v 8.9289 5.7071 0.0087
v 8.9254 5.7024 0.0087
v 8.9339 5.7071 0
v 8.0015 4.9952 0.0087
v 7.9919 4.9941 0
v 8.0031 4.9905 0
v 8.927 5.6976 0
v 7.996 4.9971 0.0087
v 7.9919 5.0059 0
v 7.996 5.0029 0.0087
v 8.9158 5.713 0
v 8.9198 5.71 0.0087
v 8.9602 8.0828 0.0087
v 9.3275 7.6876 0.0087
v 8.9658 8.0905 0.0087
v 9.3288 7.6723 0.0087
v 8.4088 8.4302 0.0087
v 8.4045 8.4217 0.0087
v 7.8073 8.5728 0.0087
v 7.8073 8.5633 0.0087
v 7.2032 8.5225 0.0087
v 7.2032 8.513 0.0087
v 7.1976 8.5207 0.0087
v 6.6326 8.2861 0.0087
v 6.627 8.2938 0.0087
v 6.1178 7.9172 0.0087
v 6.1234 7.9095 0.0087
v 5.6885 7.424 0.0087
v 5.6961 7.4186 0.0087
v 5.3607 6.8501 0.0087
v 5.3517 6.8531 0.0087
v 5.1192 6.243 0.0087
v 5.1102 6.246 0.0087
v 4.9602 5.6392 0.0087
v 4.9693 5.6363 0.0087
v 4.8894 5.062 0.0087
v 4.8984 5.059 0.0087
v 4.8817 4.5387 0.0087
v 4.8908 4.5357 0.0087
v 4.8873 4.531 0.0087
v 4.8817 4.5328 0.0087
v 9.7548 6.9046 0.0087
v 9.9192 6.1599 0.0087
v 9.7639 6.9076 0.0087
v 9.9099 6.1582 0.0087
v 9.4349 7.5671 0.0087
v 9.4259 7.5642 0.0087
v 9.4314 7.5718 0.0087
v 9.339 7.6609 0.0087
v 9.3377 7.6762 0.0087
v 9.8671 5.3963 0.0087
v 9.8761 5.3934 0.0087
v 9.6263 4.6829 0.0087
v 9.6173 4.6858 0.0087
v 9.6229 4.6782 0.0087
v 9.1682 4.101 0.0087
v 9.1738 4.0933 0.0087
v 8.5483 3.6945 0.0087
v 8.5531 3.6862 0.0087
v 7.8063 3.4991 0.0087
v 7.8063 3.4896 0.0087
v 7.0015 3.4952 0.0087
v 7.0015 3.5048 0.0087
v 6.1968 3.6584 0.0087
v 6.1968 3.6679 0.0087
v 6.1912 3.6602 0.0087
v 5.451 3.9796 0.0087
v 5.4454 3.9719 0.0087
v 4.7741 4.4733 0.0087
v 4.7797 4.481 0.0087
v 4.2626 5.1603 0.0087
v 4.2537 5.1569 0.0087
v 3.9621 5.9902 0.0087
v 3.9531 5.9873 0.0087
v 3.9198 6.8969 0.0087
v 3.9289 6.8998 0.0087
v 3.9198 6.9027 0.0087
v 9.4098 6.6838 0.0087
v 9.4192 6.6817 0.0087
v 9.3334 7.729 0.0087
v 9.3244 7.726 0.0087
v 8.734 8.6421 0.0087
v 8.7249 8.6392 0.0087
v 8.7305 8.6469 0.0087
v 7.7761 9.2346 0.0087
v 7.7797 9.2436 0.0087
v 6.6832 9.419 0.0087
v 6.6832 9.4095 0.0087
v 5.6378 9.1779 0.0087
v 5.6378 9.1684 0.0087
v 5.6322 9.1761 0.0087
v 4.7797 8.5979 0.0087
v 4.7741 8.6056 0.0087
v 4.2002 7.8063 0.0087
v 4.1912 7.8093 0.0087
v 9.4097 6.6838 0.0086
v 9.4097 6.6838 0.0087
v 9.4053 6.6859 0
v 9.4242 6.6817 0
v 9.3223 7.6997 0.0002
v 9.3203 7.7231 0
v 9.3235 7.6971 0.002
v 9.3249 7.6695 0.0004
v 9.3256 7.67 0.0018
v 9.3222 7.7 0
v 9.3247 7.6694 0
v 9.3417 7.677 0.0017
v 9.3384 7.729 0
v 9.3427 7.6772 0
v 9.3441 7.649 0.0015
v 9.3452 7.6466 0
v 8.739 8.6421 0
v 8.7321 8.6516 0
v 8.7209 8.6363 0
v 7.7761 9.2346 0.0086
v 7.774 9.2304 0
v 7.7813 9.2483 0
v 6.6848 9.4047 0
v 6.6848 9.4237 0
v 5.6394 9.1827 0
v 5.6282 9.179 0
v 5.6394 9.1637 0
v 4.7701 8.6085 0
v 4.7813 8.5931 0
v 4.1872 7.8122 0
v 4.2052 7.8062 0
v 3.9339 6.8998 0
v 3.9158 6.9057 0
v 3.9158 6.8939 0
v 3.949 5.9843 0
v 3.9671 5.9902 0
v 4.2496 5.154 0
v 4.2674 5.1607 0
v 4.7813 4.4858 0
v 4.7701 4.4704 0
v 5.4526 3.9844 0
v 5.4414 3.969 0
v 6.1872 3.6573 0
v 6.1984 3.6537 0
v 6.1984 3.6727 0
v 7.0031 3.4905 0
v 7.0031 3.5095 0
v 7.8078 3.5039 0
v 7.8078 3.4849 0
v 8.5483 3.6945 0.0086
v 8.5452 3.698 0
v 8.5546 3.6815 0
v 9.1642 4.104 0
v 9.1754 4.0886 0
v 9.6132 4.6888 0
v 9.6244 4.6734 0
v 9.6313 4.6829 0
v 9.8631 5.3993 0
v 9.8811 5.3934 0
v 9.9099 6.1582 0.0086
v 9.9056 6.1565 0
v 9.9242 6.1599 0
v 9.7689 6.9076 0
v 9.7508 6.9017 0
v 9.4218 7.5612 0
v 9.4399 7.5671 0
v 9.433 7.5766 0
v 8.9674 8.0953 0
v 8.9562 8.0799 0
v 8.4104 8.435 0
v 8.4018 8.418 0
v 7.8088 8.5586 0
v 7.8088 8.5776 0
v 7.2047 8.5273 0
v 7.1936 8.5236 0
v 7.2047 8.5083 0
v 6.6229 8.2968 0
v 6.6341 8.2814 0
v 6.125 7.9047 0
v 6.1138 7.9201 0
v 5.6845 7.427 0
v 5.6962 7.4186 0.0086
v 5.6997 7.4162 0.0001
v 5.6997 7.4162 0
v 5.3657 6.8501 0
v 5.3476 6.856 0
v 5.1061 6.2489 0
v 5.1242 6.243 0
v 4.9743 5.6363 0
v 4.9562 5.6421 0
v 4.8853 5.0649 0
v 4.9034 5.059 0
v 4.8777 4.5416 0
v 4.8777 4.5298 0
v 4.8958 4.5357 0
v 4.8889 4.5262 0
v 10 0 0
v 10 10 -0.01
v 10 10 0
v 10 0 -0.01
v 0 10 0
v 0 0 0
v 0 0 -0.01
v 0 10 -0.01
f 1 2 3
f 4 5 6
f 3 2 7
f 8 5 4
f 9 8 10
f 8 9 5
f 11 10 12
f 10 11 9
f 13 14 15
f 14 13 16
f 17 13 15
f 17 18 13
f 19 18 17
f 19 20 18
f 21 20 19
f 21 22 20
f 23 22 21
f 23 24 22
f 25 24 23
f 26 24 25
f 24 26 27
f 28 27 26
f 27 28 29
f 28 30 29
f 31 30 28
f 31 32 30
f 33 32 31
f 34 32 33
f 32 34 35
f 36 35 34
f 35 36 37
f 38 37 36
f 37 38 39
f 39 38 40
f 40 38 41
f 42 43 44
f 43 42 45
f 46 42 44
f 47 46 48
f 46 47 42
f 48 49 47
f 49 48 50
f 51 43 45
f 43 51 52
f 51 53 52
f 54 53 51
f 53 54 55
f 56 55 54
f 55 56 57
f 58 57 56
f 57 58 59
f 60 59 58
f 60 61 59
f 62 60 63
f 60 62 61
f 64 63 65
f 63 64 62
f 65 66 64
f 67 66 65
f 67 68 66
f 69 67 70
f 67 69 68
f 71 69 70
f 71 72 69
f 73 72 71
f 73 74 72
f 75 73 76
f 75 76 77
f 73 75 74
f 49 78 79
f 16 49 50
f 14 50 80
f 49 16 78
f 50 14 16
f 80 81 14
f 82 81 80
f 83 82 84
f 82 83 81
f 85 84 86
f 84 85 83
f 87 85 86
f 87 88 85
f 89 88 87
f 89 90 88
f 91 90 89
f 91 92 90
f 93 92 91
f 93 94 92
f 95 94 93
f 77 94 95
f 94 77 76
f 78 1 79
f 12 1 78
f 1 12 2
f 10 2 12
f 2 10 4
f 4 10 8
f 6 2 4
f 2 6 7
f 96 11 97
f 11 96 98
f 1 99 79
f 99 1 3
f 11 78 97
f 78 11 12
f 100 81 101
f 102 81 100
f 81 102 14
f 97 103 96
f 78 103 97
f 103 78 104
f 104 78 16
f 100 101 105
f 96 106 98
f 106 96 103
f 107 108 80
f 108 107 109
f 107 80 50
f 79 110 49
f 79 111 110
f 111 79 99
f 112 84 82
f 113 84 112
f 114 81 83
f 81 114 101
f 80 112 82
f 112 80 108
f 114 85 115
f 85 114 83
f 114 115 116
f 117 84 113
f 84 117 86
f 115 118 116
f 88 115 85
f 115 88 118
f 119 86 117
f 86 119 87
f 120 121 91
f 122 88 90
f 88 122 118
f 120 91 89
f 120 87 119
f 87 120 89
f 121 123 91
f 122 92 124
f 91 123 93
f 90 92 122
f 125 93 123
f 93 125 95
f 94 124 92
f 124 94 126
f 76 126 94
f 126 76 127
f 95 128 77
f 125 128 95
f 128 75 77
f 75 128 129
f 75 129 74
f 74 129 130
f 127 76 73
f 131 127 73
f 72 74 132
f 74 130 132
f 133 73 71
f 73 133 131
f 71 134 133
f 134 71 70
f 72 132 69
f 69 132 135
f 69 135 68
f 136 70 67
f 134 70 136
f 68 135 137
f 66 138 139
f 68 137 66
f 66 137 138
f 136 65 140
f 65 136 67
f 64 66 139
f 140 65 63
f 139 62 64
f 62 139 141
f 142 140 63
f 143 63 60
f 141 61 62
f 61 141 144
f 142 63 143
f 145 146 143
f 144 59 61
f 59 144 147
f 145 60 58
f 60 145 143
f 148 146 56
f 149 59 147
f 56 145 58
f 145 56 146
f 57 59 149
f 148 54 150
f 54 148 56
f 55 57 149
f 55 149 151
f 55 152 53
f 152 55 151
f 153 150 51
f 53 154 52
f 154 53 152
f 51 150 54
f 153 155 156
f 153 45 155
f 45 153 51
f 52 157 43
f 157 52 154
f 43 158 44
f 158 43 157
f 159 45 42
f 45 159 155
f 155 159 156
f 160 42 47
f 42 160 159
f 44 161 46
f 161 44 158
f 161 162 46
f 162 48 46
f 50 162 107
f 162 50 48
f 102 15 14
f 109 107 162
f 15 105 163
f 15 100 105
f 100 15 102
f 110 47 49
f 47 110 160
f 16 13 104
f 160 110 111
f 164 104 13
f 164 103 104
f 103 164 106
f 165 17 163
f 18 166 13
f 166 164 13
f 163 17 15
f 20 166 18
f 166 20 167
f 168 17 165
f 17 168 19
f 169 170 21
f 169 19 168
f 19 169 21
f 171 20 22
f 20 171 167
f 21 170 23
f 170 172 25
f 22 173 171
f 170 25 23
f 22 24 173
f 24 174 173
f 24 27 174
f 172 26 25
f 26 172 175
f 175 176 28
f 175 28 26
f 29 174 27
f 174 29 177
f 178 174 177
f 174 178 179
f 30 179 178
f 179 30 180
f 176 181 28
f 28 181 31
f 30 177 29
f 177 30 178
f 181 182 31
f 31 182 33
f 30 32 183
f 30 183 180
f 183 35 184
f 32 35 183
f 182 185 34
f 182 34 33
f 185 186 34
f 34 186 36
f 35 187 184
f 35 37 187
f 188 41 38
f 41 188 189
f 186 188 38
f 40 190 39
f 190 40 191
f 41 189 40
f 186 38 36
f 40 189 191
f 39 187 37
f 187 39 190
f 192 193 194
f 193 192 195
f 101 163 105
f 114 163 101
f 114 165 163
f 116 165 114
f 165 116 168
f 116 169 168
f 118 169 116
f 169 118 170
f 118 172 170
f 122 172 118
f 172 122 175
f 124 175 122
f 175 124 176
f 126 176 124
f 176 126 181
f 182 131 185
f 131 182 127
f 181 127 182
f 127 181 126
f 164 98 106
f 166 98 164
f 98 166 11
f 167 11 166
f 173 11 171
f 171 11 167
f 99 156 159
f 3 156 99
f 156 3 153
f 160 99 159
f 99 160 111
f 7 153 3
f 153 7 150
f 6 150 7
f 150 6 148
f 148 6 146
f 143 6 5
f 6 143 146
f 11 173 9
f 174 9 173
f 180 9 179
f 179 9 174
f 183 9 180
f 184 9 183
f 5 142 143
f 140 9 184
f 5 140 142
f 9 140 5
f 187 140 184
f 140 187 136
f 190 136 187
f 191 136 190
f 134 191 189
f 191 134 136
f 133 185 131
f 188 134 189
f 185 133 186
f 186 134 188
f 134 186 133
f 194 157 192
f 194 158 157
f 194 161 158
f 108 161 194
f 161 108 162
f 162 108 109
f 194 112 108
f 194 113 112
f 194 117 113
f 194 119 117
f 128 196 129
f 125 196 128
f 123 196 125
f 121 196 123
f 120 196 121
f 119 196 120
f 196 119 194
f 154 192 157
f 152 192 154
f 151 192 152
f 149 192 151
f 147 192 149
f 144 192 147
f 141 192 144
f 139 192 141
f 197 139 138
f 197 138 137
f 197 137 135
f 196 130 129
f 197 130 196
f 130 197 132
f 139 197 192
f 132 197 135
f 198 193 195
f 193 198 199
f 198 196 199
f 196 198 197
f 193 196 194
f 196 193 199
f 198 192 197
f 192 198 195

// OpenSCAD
hull(){
    translate([8.0, 5.0]) sphere(0.01);
    translate([8.923879532511288, 5.707106781186548]) sphere(0.01);
}
hull(){
    translate([8.923879532511288, 5.707106781186548]) sphere(0.01);
    translate([9.414213562373096, 6.681695534462901]) sphere(0.01);
}
hull(){
    translate([9.414213562373096, 6.681695534462901]) sphere(0.01);
    translate([9.32842712474619, 7.728968627421411]) sphere(0.01);
}
hull(){
    translate([9.32842712474619, 7.728968627421411]) sphere(0.01);
    translate([8.72896862742141, 8.642135623730951]) sphere(0.01);
}
hull(){
    translate([8.72896862742141, 8.642135623730951]) sphere(0.01);
    translate([7.778174593052022, 9.238795325112868]) sphere(0.01);
}
hull(){
    translate([7.778174593052022, 9.238795325112868]) sphere(0.01);
    translate([6.681695534462901, 9.414213562373096]) sphere(0.01);
}
hull(){
    translate([6.681695534462901, 9.414213562373096]) sphere(0.01);
    translate([5.636271020618318, 9.173165676349102]) sphere(0.01);
}
hull(){
    translate([5.636271020618318, 9.173165676349102]) sphere(0.01);
    translate([4.778174593052023, 8.60263442893731]) sphere(0.01);
}
hull(){
    translate([4.778174593052023, 8.60263442893731]) sphere(0.01);
    translate([4.195262254874781, 7.806334362268053]) sphere(0.01);
}
hull(){
    translate([4.195262254874781, 7.806334362268053]) sphere(0.01);
    translate([3.923879532511287, 6.899796377705886]) sphere(0.01);
}
hull(){
    translate([3.923879532511287, 6.899796377705886]) sphere(0.01);
    translate([3.957106781186548, 5.990203622294114]) sphere(0.01);
}
hull(){
    translate([3.957106781186548, 5.990203622294114]) sphere(0.01);
    translate([4.257731092227135, 5.159862406744893]) sphere(0.01);
}
hull(){
    translate([4.257731092227135, 5.159862406744893]) sphere(0.01);
    translate([4.778174593052022, 4.476264755067966]) sphere(0.01);
}
hull(){
    translate([4.778174593052022, 4.476264755067966]) sphere(0.01);
    translate([5.449489742783178, 3.974874092559089]) sphere(0.01);
}
hull(){
    translate([5.449489742783178, 3.974874092559089]) sphere(0.01);
    translate([6.195262254874781, 3.663165676349102]) sphere(0.01);
}
hull(){
    translate([6.195262254874781, 3.663165676349102]) sphere(0.01);
    translate([7.0, 3.5]) sphere(0.01);
}
hull(){
    translate([7.0, 3.5]) sphere(0.01);
    translate([7.804737745125219, 3.494381533400286]) sphere(0.01);
}
hull(){
    translate([7.804737745125219, 3.494381533400286]) sphere(0.01);
    translate([8.551510257216822, 3.69098300562505]) sphere(0.01);
}
hull(){
    translate([8.551510257216822, 3.69098300562505]) sphere(0.01);
    translate([9.172268907772864, 4.098076211353316]) sphere(0.01);
}
hull(){
    translate([9.172268907772864, 4.098076211353316]) sphere(0.01);
    translate([9.621320343650899, 4.682905726811017]) sphere(0.01);
}
hull(){
    translate([9.621320343650899, 4.682905726811017]) sphere(0.01);
    translate([9.871145686361793, 5.393398282201787]) sphere(0.01);
}
hull(){
    translate([9.871145686361793, 5.393398282201787]) sphere(0.01);
    translate([9.914213562373096, 6.159862406744894]) sphere(0.01);
}
hull(){
    translate([9.914213562373096, 6.159862406744894]) sphere(0.01);
    translate([9.758883371132889, 6.907577466590869]) sphere(0.01);
}
hull(){
    translate([9.758883371132889, 6.907577466590869]) sphere(0.01);
    translate([9.429903811094697, 7.567094098561119]) sphere(0.01);
}
hull(){
    translate([9.429903811094697, 7.567094098561119]) sphere(0.01);
    translate([8.964277450262594, 8.085786437626904]) sphere(0.01);
}
hull(){
    translate([8.964277450262594, 8.085786437626904]) sphere(0.01);
    translate([8.407265029719683, 8.425465444556746]) sphere(0.01);
}
hull(){
    translate([8.407265029719683, 8.425465444556746]) sphere(0.01);
    translate([7.805738034968084, 8.568064746731157]) sphere(0.01);
}
hull(){
    translate([7.805738034968084, 8.568064746731157]) sphere(0.01);
    translate([7.201658293584648, 8.517766952966369]) sphere(0.01);
}
hull(){
    translate([7.201658293584648, 8.517766952966369]) sphere(0.01);
    translate([6.631010188905304, 8.290896809908832]) sphere(0.01);
}
hull(){
    translate([6.631010188905304, 8.290896809908832]) sphere(0.01);
    translate([6.121893628367208, 7.914213562373095]) sphere(0.01);
}
hull(){
    translate([6.121893628367208, 7.914213562373095]) sphere(0.01);
    translate([5.69257779438413, 7.421088586345386]) sphere(0.01);
}
hull(){
    translate([5.69257779438413, 7.421088586345386]) sphere(0.01);
    translate([5.355722549737405, 6.850130466773258]) sphere(0.01);
}
hull(){
    translate([5.355722549737405, 6.850130466773258]) sphere(0.01);
    translate([5.114213562373096, 6.243036094296548]) sphere(0.01);
}
hull(){
    translate([5.114213562373096, 6.243036094296548]) sphere(0.01);
    translate([4.964277450262595, 5.636271020618318]) sphere(0.01);
}
hull(){
    translate([4.964277450262595, 5.636271020618318]) sphere(0.01);
    translate([4.893398282201787, 5.059017212748632]) sphere(0.01);
}
hull(){
    translate([4.893398282201787, 5.059017212748632]) sphere(0.01);
    translate([4.885786437626904, 4.535722549737405]) sphere(0.01);
}
translate([0,0,-0.01]) color([0.1,0.1,0.1]) cube([10,10,0.01]);
